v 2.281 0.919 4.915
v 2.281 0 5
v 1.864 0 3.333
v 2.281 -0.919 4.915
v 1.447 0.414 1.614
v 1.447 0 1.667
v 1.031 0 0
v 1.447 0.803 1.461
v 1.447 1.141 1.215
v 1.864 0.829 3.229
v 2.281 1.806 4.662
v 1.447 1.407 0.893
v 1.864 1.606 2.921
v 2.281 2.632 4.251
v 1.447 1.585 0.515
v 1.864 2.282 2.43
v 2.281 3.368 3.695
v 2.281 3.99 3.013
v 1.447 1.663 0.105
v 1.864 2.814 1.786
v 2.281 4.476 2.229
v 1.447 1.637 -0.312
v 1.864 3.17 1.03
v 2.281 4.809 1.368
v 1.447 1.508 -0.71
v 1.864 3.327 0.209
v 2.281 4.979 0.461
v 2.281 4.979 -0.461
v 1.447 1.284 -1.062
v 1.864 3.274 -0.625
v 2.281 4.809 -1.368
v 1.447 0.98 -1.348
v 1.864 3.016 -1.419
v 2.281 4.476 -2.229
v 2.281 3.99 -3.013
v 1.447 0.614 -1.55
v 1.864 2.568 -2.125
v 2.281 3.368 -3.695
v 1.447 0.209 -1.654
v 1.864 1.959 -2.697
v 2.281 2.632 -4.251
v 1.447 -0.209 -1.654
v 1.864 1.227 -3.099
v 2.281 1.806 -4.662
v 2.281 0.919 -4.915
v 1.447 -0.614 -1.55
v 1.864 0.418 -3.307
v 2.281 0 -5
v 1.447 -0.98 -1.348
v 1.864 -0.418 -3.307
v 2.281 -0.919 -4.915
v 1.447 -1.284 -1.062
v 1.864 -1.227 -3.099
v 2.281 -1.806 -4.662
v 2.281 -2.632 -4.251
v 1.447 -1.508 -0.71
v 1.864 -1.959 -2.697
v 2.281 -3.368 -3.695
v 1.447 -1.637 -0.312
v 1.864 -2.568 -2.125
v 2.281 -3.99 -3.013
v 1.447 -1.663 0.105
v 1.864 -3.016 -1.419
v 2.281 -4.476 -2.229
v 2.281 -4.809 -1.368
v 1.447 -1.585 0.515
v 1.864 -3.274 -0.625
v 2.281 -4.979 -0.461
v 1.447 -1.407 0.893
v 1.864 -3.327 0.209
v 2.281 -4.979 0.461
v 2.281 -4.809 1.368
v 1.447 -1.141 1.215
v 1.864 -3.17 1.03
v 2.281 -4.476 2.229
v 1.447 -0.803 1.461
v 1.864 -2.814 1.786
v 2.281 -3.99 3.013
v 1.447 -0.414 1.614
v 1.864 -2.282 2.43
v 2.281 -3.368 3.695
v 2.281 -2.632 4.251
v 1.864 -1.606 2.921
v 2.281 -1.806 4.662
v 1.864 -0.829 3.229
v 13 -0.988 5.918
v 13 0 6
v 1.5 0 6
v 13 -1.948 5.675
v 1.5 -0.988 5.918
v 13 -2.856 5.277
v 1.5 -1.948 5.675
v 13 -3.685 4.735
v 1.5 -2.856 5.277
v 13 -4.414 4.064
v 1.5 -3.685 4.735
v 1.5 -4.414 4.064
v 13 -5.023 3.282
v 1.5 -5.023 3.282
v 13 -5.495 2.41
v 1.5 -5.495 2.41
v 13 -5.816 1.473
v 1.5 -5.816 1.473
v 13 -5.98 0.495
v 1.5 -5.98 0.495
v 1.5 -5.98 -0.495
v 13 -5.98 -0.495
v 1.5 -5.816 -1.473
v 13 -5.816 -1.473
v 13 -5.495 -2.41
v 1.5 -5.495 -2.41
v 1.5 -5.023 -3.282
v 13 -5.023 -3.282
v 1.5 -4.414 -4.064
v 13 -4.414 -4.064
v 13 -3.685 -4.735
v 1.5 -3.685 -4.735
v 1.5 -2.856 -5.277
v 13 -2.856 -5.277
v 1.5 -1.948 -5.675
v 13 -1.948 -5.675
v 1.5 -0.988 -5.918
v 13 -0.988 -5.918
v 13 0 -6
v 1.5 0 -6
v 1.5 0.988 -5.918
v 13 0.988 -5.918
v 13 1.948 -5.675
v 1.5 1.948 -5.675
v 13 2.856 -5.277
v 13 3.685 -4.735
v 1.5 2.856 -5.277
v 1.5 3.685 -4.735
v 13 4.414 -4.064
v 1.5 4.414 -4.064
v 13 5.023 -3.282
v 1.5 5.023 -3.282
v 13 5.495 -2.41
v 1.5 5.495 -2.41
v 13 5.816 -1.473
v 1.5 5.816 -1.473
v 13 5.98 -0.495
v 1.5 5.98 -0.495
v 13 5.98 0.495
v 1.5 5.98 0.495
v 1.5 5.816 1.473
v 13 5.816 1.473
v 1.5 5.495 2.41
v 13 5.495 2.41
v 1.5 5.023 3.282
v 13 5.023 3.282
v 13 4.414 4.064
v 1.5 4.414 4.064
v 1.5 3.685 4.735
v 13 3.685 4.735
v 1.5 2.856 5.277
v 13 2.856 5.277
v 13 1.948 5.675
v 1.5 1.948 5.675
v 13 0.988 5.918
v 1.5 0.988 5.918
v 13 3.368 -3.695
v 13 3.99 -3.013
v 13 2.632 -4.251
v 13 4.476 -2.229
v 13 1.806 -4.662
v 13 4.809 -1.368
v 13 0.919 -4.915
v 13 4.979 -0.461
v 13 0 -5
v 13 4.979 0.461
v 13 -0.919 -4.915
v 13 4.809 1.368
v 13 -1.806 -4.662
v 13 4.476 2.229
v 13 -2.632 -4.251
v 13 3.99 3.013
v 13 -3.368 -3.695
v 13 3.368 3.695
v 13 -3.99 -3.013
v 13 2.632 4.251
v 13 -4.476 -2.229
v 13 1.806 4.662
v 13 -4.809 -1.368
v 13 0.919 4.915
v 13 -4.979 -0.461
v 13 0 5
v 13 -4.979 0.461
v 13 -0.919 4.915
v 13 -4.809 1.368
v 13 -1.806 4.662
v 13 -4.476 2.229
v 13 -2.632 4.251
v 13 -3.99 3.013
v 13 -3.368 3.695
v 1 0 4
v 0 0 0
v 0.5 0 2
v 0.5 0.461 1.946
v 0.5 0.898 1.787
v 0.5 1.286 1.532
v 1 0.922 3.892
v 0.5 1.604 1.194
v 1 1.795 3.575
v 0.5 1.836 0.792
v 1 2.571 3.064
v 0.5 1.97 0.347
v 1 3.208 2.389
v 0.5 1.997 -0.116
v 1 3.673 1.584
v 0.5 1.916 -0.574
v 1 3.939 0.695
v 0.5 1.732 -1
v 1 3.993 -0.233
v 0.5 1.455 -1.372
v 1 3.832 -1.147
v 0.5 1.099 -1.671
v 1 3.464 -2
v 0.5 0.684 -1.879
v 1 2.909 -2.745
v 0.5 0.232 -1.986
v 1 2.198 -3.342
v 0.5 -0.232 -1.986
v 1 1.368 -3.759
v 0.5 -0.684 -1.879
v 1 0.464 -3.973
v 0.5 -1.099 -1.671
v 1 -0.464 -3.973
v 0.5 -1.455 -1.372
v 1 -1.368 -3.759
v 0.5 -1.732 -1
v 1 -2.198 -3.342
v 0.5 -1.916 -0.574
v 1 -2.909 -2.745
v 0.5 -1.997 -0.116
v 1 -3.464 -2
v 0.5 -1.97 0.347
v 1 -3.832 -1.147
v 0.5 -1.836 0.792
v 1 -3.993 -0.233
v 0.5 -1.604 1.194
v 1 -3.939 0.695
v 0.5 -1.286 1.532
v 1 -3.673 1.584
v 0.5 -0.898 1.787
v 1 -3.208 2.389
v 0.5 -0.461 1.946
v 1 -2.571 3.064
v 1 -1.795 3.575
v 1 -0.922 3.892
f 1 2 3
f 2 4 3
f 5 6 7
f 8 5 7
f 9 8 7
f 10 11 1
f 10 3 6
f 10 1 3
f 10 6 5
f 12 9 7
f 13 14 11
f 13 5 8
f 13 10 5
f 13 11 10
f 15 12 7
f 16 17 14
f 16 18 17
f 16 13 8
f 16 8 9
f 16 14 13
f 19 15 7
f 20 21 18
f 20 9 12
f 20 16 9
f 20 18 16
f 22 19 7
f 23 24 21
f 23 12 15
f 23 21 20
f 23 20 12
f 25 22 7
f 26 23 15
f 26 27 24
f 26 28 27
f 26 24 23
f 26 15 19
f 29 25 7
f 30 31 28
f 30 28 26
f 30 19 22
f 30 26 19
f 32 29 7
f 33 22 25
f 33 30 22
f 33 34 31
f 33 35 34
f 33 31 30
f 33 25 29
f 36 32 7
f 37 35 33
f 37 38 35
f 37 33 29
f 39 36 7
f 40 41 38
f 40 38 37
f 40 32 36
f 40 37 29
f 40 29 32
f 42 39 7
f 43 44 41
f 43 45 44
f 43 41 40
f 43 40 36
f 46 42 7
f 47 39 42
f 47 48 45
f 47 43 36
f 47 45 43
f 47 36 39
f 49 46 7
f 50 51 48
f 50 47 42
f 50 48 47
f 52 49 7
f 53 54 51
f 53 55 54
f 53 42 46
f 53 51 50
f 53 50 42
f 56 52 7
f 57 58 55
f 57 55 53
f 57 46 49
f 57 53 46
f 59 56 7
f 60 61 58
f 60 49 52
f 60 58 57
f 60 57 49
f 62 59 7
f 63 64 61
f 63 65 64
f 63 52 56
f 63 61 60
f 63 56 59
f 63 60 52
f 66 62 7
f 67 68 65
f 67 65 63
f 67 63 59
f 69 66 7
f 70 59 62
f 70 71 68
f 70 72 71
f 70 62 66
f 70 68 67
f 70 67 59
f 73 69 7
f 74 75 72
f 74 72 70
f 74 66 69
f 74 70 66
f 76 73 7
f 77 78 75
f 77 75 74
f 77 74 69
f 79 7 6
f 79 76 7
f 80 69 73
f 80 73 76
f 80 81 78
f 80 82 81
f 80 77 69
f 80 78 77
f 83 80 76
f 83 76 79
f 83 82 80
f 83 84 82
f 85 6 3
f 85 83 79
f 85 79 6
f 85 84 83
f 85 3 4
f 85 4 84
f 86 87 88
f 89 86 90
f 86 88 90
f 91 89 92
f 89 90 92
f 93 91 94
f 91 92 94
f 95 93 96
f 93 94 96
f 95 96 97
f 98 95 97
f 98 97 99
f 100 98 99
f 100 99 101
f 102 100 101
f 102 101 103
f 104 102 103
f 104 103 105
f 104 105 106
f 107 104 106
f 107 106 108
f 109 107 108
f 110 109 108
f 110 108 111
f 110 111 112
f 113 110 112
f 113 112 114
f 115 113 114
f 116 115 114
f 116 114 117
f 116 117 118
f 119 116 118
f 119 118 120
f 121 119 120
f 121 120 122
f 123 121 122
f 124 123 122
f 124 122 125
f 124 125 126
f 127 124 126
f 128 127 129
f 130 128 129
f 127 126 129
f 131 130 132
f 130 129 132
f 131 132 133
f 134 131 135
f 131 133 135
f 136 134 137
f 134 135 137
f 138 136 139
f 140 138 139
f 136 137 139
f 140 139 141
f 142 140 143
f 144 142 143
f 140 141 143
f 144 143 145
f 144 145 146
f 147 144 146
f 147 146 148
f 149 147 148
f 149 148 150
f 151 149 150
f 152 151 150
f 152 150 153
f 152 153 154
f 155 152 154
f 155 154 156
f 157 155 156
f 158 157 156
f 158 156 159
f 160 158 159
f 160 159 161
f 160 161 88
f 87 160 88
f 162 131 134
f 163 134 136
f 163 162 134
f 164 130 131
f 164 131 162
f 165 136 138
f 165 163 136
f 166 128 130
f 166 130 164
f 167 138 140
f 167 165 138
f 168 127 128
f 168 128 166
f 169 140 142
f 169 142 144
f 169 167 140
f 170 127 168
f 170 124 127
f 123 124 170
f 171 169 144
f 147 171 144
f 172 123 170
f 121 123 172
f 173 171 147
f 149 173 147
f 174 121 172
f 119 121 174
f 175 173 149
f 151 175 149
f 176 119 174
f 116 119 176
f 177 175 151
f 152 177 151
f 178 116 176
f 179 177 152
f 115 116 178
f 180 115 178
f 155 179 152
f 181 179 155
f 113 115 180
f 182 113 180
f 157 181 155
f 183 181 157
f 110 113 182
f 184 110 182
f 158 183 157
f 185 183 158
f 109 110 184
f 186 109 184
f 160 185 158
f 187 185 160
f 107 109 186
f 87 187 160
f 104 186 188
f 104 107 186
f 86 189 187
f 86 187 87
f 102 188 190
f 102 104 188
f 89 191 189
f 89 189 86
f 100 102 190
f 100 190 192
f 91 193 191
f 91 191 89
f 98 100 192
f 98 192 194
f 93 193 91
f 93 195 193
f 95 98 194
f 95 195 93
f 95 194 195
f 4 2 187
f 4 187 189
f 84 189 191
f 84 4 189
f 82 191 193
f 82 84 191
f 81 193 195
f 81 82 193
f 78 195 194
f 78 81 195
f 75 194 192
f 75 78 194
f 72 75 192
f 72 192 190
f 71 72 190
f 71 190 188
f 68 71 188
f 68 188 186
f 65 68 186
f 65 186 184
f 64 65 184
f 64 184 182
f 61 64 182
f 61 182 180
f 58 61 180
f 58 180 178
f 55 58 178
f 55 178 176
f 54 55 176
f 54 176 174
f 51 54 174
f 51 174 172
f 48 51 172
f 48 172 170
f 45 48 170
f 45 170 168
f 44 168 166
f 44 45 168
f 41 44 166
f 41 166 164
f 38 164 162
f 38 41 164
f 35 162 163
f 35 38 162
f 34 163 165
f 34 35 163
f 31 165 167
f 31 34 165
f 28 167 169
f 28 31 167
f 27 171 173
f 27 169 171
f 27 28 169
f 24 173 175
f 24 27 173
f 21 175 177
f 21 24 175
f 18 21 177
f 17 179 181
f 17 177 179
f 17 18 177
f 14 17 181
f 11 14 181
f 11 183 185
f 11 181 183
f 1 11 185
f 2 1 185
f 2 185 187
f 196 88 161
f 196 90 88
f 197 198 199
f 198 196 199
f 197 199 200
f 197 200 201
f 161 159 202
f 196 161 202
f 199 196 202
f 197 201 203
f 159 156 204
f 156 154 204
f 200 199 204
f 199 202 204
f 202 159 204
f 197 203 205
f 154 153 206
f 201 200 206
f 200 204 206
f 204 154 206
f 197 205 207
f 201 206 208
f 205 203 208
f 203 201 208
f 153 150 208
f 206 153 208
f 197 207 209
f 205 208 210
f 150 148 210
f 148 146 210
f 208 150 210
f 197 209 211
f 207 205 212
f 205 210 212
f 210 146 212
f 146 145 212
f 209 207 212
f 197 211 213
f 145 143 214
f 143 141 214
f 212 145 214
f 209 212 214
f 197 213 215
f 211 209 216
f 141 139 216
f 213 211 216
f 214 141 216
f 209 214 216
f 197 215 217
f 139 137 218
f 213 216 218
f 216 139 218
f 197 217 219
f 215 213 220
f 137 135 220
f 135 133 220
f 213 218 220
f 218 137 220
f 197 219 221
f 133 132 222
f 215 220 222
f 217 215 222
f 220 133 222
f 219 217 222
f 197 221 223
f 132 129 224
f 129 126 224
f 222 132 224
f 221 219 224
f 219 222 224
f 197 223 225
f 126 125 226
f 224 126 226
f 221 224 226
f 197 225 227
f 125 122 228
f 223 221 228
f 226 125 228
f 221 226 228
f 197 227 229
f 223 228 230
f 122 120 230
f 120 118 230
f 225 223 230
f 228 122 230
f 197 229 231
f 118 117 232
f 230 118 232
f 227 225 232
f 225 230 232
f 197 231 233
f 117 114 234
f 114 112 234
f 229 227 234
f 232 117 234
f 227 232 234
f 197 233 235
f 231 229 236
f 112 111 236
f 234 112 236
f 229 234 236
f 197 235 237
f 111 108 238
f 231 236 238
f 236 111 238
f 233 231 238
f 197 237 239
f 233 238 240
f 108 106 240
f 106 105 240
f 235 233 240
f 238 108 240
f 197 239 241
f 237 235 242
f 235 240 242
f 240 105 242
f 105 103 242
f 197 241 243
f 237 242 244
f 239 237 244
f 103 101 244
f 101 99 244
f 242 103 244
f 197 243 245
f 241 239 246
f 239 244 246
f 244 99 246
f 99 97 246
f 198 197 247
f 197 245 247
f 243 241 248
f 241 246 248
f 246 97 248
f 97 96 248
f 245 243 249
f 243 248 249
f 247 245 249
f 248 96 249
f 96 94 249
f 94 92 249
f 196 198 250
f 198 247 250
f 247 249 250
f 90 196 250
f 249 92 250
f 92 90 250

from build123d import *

# Parameters (mm, degrees)
SKETCH_1_R      = 6
EXTRUDE_1_DEPTH = 13
SHELL_1_T       = -1


with BuildPart() as part:
    # 草圖1 → 填料-伸長1 (new body)
    with BuildSketch(Plane(origin=(0, 0, 0), x_dir=(0, 0, -1), z_dir=(1, 0, 0))):
        with Locations(Location((0, 0, 0), (0, 0, 180))):
            Circle(SKETCH_1_R)
    extrude(amount=EXTRUDE_1_DEPTH)

    # 草圖2 → 除料-旋轉2 (revolve, cut)
    with BuildSketch(Plane(origin=(0, 0, 0), x_dir=(1, 0, 0), z_dir=(0, 1, 0)), mode=Mode.PRIVATE) as cut_revolve_2_sk:
        Polygon((0, 0), (1.5, 6), (1.5, 6.496398709), (-0.462606834, 6.496398709), (-0.462606834, 0), align=None)
    revolve(cut_revolve_2_sk.sketch.rotate(Axis((1.002912705, 0, 0), (-1, 0, 0)), 180), axis=Axis((1.002912705, 0, 0), (-1, 0, 0)), mode=Mode.SUBTRACT)

    # 薄殼1
    shell_1_openings = [part.faces().sort_by_distance(p)[0] for p in [
        (13, 0, 0),
    ]]
    offset(amount=SHELL_1_T, openings=shell_1_openings, kind=Kind.INTERSECTION)


solid = part.part
